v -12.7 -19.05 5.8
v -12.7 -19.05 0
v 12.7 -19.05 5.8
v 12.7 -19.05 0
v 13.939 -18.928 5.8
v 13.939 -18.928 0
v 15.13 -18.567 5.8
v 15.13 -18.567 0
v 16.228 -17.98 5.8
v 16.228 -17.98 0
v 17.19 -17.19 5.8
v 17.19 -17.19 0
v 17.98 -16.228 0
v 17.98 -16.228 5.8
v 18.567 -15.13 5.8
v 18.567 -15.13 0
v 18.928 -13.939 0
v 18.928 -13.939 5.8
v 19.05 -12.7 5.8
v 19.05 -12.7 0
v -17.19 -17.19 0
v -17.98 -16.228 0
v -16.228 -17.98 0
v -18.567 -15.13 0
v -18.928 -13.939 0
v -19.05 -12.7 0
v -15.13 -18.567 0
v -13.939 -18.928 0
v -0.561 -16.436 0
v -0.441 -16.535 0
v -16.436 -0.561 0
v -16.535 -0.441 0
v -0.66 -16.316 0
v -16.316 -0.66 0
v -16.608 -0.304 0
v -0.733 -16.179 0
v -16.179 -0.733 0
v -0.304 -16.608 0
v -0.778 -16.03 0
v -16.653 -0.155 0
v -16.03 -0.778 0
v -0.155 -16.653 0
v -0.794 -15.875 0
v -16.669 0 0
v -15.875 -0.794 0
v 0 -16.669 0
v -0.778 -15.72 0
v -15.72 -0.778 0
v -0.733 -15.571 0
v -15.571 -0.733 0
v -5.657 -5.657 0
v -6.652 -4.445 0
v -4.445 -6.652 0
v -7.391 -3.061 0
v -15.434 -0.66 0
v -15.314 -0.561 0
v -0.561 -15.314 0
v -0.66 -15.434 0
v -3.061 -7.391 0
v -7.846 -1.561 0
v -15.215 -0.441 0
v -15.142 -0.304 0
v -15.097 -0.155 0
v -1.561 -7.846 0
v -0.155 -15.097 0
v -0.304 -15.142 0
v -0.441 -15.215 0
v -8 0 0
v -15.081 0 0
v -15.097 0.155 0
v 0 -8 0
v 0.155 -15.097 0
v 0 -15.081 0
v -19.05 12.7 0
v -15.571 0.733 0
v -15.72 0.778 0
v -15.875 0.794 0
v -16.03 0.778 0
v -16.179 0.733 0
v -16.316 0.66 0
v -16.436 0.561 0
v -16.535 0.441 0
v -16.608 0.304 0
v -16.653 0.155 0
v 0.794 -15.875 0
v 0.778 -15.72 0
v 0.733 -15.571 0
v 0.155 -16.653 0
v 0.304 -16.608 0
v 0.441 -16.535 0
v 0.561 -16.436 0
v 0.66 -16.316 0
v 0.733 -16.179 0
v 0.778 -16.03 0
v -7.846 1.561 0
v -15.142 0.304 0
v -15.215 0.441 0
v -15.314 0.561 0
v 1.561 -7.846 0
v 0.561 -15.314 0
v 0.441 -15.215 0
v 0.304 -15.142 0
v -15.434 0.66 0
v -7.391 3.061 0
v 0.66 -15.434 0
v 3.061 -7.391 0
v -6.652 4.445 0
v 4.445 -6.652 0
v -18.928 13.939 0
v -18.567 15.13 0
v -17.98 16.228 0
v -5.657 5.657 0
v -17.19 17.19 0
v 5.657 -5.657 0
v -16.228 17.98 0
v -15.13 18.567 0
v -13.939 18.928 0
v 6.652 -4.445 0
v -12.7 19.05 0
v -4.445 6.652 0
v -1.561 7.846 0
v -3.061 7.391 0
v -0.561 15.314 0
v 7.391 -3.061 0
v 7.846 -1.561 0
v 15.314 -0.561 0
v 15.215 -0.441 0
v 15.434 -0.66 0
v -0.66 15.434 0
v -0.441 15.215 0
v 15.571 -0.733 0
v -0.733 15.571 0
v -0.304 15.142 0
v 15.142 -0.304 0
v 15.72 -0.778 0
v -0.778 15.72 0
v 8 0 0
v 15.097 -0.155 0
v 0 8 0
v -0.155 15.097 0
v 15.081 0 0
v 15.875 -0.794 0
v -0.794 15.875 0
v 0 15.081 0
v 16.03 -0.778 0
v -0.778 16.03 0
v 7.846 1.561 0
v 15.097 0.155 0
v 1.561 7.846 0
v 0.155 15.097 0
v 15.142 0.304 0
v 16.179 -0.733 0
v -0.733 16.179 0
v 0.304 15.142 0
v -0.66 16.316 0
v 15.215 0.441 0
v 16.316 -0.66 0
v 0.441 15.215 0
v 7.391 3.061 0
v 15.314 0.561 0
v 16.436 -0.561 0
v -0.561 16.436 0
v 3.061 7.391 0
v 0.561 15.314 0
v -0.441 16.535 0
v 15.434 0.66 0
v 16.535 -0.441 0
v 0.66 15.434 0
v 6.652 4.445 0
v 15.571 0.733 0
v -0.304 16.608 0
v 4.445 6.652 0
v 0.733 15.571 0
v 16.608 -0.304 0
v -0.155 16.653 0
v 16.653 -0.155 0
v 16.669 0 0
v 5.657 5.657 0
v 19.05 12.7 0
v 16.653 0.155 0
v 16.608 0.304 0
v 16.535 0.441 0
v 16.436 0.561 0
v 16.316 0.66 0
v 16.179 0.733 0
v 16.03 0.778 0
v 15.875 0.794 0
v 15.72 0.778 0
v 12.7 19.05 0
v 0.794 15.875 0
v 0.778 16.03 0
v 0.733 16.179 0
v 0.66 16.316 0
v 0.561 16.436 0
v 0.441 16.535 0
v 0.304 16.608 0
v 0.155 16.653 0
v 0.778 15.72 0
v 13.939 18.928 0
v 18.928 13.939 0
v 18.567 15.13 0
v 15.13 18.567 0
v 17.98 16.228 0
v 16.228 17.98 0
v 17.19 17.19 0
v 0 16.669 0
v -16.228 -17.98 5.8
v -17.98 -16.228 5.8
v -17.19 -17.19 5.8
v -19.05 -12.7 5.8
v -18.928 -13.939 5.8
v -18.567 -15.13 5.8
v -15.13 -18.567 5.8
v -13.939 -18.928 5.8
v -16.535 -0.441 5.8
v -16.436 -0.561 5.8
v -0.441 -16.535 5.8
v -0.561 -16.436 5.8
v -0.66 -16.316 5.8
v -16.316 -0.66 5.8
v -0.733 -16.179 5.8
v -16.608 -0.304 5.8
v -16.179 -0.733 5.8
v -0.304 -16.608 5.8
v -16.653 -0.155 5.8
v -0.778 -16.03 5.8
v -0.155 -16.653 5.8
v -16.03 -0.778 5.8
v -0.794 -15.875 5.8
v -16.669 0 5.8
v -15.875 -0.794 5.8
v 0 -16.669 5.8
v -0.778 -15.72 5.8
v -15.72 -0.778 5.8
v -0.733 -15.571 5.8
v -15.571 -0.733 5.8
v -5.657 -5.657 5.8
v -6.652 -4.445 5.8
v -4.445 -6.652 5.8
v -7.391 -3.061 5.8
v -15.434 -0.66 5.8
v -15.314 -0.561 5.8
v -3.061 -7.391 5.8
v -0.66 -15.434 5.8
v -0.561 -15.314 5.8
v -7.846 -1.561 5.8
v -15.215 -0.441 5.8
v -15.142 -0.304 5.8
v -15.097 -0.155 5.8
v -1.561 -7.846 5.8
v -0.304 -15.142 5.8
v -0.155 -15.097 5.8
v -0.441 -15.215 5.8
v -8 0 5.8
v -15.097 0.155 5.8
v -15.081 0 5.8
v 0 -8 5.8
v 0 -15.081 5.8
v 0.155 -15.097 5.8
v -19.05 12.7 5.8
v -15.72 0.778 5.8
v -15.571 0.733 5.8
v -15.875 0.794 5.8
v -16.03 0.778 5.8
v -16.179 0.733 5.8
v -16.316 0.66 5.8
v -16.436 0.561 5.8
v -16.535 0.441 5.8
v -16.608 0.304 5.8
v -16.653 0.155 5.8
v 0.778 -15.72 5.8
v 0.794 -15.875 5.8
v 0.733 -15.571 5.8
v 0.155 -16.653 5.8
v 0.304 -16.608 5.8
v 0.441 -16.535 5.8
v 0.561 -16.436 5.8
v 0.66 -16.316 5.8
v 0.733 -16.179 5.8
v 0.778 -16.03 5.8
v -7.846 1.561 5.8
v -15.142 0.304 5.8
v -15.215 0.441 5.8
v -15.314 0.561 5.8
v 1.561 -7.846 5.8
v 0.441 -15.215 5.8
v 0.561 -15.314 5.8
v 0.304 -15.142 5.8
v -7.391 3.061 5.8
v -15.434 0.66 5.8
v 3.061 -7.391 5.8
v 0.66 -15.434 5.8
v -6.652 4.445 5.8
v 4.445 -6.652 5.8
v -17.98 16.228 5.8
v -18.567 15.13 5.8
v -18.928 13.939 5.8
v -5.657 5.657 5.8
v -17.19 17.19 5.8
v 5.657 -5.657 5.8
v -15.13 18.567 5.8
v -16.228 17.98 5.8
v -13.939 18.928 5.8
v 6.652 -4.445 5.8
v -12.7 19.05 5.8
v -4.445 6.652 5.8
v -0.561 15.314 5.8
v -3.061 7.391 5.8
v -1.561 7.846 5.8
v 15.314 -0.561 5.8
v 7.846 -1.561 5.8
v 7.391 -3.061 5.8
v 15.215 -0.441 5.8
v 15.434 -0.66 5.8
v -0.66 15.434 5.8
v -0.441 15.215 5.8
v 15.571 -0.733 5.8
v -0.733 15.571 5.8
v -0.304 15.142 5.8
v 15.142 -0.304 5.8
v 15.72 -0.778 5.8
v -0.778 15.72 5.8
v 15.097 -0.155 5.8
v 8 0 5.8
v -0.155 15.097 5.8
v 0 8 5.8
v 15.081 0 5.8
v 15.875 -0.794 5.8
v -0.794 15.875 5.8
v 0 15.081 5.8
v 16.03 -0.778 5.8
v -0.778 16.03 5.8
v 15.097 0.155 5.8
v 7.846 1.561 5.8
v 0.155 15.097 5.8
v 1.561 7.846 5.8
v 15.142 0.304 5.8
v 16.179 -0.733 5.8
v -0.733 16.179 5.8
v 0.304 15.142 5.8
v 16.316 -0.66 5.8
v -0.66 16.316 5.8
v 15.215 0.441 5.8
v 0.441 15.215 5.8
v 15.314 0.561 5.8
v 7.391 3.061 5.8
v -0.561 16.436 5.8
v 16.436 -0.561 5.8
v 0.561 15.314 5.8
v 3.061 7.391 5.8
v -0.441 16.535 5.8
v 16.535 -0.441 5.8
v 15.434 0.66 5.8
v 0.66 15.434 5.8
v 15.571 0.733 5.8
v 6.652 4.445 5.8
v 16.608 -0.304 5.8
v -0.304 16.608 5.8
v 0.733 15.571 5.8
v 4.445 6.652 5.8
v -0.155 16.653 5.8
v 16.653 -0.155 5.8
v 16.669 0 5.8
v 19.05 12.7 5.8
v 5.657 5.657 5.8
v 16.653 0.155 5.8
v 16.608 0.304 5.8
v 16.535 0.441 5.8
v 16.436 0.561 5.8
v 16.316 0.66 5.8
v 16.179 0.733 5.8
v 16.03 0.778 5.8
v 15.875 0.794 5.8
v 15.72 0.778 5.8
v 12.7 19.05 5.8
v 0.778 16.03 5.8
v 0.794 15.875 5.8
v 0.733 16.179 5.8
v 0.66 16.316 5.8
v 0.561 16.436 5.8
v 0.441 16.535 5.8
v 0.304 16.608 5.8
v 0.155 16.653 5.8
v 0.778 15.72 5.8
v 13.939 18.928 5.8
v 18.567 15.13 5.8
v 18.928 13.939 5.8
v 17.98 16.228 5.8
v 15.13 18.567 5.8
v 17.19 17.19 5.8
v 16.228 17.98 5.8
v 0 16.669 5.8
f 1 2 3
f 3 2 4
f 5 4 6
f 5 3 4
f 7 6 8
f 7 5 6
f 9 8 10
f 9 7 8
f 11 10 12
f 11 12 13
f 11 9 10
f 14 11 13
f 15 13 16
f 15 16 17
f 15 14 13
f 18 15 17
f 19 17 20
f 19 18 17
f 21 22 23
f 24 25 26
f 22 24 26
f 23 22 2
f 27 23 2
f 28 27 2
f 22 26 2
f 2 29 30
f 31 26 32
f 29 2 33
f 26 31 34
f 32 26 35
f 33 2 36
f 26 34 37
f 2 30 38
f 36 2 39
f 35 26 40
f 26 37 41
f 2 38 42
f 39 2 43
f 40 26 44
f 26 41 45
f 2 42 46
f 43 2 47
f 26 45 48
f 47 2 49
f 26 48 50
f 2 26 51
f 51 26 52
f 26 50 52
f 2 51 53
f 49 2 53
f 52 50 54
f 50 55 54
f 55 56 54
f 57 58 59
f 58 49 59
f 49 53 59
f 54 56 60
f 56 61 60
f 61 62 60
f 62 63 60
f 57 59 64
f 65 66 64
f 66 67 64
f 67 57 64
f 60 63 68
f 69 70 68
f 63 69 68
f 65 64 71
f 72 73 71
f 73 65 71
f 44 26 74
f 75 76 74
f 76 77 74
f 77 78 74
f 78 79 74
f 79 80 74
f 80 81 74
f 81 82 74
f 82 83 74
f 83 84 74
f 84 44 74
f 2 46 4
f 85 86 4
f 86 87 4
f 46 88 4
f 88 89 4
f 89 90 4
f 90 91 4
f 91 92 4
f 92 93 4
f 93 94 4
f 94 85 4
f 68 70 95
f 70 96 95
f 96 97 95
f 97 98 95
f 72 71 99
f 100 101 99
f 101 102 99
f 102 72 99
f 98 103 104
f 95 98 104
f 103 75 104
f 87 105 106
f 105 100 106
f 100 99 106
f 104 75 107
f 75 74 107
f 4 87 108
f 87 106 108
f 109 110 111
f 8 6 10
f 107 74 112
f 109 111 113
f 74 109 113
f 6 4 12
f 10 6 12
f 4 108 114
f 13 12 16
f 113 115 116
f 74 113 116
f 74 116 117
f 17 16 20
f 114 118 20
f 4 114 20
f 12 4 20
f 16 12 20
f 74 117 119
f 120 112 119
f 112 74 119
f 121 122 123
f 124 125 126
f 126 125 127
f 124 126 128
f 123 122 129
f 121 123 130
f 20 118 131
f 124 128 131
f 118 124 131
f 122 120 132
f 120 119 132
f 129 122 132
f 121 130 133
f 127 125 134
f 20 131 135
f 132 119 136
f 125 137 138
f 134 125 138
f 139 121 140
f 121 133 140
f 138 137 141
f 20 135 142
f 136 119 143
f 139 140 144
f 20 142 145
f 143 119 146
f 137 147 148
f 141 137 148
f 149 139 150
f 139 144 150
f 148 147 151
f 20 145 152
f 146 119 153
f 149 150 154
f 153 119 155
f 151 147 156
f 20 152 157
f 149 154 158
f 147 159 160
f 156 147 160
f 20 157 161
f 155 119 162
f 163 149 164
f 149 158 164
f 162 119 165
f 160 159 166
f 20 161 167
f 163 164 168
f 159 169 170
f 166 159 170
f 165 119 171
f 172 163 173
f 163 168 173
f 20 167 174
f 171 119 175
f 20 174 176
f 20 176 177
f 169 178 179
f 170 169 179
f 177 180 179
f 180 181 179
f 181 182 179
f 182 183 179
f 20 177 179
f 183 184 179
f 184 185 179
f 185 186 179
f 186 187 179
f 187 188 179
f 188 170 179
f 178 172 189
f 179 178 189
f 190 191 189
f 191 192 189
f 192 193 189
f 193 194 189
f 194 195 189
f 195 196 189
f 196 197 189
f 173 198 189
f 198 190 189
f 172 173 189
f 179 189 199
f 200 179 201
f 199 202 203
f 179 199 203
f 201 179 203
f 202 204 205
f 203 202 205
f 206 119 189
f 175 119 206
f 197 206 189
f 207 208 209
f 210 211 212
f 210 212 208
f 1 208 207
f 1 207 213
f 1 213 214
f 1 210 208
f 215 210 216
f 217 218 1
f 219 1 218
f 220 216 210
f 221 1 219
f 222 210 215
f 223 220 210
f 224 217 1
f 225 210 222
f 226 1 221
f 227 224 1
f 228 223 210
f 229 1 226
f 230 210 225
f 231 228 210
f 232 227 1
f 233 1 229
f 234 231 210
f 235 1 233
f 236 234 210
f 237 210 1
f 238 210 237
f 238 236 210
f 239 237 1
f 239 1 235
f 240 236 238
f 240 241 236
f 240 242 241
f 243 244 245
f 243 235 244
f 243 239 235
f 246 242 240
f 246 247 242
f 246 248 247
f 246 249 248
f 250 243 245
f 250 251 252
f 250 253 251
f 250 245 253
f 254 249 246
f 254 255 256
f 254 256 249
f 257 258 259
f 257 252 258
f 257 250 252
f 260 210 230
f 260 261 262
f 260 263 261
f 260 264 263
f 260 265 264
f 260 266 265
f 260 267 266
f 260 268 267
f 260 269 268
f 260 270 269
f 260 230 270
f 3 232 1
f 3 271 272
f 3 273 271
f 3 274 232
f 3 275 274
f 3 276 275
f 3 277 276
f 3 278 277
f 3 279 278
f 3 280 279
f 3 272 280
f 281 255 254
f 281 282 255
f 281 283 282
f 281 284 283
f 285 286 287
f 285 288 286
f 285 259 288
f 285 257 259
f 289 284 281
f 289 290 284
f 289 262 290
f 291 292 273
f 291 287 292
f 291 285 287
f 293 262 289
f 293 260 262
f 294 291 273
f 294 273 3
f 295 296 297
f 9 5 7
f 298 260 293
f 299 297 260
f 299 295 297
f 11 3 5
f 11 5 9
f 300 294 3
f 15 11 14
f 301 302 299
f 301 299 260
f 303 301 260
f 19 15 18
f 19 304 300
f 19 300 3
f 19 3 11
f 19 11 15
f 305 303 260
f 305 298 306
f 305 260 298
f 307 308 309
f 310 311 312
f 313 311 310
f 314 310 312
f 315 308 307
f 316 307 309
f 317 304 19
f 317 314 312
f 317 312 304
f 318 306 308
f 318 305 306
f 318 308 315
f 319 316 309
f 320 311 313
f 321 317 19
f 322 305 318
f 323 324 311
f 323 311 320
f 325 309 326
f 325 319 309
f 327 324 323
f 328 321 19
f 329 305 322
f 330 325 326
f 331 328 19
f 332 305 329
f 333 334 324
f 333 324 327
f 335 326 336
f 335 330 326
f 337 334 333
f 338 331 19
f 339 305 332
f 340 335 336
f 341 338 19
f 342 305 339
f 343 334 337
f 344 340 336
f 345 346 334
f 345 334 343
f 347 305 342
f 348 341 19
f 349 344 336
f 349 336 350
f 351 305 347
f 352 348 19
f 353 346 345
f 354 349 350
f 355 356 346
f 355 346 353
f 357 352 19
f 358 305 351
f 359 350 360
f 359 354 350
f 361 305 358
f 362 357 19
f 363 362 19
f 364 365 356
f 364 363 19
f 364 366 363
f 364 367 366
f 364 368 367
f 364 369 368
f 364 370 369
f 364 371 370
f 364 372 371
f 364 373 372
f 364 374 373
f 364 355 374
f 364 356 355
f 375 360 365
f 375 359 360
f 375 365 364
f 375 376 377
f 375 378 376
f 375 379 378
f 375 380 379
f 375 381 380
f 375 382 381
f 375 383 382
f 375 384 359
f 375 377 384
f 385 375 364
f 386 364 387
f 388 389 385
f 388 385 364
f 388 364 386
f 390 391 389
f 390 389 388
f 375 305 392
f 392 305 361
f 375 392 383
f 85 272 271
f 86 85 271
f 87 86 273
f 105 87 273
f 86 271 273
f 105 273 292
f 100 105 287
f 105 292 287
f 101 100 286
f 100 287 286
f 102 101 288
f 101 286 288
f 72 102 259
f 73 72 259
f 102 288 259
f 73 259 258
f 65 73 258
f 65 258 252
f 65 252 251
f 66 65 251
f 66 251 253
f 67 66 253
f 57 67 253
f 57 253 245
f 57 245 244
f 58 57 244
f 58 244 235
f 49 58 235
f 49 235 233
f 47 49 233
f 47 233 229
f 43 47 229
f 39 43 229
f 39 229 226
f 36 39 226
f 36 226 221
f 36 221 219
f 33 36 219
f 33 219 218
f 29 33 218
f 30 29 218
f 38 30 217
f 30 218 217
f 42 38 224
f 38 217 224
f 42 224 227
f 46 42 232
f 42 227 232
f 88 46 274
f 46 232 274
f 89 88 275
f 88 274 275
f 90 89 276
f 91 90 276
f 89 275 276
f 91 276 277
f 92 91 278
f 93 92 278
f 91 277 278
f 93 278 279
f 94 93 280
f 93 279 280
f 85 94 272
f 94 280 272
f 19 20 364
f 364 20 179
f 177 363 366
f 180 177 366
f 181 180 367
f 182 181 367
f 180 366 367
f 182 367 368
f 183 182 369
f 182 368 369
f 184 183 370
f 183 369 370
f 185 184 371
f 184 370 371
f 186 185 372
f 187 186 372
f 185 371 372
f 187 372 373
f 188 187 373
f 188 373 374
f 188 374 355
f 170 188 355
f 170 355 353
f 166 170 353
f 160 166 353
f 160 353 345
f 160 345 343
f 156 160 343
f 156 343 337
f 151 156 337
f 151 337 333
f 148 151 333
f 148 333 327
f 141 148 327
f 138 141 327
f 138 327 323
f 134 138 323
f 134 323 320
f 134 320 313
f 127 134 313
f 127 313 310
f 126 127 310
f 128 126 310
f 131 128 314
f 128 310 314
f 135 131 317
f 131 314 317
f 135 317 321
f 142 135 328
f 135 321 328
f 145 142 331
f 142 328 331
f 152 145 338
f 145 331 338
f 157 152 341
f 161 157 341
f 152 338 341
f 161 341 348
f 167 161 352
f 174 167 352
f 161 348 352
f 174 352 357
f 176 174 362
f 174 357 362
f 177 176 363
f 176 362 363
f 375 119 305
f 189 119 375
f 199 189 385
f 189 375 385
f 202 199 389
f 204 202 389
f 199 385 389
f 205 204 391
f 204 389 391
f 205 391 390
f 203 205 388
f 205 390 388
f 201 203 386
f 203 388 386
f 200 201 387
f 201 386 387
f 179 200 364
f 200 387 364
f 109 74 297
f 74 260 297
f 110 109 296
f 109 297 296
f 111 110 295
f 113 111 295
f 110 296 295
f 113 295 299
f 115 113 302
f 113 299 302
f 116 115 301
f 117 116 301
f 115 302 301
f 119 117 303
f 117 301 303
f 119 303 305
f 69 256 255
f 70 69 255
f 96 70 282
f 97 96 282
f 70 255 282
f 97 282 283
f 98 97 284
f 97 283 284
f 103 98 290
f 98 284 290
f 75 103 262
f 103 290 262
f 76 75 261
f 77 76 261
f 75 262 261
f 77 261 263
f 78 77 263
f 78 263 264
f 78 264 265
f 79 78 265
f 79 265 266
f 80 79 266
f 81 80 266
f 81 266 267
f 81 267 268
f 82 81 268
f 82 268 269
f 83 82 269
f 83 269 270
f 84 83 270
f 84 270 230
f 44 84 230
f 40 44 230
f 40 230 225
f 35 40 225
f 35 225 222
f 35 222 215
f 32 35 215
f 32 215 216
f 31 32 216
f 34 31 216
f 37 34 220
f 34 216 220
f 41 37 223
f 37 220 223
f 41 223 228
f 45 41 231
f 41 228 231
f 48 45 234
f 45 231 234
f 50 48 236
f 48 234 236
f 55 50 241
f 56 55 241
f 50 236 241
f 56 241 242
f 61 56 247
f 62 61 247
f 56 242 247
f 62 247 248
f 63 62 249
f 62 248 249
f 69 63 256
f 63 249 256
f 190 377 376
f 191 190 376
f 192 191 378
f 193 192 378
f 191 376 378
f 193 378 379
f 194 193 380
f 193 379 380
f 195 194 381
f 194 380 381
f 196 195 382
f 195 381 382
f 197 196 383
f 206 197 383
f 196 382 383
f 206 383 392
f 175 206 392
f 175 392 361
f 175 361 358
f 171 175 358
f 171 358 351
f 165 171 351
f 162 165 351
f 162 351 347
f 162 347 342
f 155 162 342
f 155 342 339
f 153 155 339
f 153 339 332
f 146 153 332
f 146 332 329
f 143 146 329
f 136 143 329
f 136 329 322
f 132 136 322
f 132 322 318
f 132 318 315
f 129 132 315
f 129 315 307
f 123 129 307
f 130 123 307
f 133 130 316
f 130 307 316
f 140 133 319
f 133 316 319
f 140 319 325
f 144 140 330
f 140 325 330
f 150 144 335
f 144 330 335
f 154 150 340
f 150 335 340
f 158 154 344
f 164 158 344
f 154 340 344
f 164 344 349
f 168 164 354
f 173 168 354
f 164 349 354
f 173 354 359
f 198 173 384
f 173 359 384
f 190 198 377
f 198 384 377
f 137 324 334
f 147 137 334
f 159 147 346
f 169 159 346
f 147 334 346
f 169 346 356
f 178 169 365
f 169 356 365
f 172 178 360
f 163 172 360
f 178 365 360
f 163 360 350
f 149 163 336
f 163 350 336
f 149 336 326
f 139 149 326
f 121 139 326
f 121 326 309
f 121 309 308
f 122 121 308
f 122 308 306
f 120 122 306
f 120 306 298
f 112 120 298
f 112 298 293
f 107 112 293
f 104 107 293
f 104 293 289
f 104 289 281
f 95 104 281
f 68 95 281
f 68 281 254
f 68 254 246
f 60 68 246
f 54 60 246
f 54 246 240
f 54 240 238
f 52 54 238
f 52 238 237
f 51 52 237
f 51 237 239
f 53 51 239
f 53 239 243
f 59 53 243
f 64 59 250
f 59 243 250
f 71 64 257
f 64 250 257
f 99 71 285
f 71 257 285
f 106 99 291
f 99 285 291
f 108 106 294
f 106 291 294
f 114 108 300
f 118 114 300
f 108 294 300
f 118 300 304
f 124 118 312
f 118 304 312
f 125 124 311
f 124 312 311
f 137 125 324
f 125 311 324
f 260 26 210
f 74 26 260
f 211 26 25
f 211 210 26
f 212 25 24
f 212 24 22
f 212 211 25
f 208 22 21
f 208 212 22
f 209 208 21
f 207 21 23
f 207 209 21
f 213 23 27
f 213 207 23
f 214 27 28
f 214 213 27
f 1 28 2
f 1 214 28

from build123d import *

# Parameters (mm, degrees)
SKETCH1_W           = 38.1
SKETCH1_H           = 38.1
BOSS_EXTRUDE1_DEPTH = 5.8
SKETCH2_R           = 0.79375
CUT_EXTRUDE1_DEPTH  = 28.558029683
SKETCH3_R           = 8
CUT_EXTRUDE2_DEPTH  = 12.7
FILLET1_R           = 6.35


with BuildPart() as part:
    # Sketch1 → Boss-Extrude1 (new body)
    with BuildSketch(Plane.XY):
        Rectangle(SKETCH1_W, SKETCH1_H)
    extrude(amount=BOSS_EXTRUDE1_DEPTH)

    # Sketch2 → Cut-Extrude1 (cut, through all)
    with BuildSketch(Plane.XY.offset(5.8)):
        with Locations((0, 15.875)):
            Circle(SKETCH2_R)
        with Locations((15.875, 0)):
            Circle(SKETCH2_R)
        with Locations((0, -15.875)):
            Circle(SKETCH2_R)
        with Locations((-15.875, 0)):
            Circle(SKETCH2_R)
    extrude(amount=-CUT_EXTRUDE1_DEPTH, mode=Mode.SUBTRACT)

    # Sketch3 → Cut-Extrude2 (cut)
    with BuildSketch(Plane.XY.offset(5.8)):
        Circle(SKETCH3_R)
    extrude(amount=-CUT_EXTRUDE2_DEPTH, mode=Mode.SUBTRACT)

    # Fillet1
    fillet1_edges = [part.edges().sort_by_distance(p)[0] for p in [
        (19.05, -19.05, 2.9),
        (-19.05, -19.05, 2.9),
        (-19.05, 19.05, 2.9),
        (19.05, 19.05, 2.9),
    ]]
    fillet(fillet1_edges, radius=FILLET1_R)


solid = part.part
